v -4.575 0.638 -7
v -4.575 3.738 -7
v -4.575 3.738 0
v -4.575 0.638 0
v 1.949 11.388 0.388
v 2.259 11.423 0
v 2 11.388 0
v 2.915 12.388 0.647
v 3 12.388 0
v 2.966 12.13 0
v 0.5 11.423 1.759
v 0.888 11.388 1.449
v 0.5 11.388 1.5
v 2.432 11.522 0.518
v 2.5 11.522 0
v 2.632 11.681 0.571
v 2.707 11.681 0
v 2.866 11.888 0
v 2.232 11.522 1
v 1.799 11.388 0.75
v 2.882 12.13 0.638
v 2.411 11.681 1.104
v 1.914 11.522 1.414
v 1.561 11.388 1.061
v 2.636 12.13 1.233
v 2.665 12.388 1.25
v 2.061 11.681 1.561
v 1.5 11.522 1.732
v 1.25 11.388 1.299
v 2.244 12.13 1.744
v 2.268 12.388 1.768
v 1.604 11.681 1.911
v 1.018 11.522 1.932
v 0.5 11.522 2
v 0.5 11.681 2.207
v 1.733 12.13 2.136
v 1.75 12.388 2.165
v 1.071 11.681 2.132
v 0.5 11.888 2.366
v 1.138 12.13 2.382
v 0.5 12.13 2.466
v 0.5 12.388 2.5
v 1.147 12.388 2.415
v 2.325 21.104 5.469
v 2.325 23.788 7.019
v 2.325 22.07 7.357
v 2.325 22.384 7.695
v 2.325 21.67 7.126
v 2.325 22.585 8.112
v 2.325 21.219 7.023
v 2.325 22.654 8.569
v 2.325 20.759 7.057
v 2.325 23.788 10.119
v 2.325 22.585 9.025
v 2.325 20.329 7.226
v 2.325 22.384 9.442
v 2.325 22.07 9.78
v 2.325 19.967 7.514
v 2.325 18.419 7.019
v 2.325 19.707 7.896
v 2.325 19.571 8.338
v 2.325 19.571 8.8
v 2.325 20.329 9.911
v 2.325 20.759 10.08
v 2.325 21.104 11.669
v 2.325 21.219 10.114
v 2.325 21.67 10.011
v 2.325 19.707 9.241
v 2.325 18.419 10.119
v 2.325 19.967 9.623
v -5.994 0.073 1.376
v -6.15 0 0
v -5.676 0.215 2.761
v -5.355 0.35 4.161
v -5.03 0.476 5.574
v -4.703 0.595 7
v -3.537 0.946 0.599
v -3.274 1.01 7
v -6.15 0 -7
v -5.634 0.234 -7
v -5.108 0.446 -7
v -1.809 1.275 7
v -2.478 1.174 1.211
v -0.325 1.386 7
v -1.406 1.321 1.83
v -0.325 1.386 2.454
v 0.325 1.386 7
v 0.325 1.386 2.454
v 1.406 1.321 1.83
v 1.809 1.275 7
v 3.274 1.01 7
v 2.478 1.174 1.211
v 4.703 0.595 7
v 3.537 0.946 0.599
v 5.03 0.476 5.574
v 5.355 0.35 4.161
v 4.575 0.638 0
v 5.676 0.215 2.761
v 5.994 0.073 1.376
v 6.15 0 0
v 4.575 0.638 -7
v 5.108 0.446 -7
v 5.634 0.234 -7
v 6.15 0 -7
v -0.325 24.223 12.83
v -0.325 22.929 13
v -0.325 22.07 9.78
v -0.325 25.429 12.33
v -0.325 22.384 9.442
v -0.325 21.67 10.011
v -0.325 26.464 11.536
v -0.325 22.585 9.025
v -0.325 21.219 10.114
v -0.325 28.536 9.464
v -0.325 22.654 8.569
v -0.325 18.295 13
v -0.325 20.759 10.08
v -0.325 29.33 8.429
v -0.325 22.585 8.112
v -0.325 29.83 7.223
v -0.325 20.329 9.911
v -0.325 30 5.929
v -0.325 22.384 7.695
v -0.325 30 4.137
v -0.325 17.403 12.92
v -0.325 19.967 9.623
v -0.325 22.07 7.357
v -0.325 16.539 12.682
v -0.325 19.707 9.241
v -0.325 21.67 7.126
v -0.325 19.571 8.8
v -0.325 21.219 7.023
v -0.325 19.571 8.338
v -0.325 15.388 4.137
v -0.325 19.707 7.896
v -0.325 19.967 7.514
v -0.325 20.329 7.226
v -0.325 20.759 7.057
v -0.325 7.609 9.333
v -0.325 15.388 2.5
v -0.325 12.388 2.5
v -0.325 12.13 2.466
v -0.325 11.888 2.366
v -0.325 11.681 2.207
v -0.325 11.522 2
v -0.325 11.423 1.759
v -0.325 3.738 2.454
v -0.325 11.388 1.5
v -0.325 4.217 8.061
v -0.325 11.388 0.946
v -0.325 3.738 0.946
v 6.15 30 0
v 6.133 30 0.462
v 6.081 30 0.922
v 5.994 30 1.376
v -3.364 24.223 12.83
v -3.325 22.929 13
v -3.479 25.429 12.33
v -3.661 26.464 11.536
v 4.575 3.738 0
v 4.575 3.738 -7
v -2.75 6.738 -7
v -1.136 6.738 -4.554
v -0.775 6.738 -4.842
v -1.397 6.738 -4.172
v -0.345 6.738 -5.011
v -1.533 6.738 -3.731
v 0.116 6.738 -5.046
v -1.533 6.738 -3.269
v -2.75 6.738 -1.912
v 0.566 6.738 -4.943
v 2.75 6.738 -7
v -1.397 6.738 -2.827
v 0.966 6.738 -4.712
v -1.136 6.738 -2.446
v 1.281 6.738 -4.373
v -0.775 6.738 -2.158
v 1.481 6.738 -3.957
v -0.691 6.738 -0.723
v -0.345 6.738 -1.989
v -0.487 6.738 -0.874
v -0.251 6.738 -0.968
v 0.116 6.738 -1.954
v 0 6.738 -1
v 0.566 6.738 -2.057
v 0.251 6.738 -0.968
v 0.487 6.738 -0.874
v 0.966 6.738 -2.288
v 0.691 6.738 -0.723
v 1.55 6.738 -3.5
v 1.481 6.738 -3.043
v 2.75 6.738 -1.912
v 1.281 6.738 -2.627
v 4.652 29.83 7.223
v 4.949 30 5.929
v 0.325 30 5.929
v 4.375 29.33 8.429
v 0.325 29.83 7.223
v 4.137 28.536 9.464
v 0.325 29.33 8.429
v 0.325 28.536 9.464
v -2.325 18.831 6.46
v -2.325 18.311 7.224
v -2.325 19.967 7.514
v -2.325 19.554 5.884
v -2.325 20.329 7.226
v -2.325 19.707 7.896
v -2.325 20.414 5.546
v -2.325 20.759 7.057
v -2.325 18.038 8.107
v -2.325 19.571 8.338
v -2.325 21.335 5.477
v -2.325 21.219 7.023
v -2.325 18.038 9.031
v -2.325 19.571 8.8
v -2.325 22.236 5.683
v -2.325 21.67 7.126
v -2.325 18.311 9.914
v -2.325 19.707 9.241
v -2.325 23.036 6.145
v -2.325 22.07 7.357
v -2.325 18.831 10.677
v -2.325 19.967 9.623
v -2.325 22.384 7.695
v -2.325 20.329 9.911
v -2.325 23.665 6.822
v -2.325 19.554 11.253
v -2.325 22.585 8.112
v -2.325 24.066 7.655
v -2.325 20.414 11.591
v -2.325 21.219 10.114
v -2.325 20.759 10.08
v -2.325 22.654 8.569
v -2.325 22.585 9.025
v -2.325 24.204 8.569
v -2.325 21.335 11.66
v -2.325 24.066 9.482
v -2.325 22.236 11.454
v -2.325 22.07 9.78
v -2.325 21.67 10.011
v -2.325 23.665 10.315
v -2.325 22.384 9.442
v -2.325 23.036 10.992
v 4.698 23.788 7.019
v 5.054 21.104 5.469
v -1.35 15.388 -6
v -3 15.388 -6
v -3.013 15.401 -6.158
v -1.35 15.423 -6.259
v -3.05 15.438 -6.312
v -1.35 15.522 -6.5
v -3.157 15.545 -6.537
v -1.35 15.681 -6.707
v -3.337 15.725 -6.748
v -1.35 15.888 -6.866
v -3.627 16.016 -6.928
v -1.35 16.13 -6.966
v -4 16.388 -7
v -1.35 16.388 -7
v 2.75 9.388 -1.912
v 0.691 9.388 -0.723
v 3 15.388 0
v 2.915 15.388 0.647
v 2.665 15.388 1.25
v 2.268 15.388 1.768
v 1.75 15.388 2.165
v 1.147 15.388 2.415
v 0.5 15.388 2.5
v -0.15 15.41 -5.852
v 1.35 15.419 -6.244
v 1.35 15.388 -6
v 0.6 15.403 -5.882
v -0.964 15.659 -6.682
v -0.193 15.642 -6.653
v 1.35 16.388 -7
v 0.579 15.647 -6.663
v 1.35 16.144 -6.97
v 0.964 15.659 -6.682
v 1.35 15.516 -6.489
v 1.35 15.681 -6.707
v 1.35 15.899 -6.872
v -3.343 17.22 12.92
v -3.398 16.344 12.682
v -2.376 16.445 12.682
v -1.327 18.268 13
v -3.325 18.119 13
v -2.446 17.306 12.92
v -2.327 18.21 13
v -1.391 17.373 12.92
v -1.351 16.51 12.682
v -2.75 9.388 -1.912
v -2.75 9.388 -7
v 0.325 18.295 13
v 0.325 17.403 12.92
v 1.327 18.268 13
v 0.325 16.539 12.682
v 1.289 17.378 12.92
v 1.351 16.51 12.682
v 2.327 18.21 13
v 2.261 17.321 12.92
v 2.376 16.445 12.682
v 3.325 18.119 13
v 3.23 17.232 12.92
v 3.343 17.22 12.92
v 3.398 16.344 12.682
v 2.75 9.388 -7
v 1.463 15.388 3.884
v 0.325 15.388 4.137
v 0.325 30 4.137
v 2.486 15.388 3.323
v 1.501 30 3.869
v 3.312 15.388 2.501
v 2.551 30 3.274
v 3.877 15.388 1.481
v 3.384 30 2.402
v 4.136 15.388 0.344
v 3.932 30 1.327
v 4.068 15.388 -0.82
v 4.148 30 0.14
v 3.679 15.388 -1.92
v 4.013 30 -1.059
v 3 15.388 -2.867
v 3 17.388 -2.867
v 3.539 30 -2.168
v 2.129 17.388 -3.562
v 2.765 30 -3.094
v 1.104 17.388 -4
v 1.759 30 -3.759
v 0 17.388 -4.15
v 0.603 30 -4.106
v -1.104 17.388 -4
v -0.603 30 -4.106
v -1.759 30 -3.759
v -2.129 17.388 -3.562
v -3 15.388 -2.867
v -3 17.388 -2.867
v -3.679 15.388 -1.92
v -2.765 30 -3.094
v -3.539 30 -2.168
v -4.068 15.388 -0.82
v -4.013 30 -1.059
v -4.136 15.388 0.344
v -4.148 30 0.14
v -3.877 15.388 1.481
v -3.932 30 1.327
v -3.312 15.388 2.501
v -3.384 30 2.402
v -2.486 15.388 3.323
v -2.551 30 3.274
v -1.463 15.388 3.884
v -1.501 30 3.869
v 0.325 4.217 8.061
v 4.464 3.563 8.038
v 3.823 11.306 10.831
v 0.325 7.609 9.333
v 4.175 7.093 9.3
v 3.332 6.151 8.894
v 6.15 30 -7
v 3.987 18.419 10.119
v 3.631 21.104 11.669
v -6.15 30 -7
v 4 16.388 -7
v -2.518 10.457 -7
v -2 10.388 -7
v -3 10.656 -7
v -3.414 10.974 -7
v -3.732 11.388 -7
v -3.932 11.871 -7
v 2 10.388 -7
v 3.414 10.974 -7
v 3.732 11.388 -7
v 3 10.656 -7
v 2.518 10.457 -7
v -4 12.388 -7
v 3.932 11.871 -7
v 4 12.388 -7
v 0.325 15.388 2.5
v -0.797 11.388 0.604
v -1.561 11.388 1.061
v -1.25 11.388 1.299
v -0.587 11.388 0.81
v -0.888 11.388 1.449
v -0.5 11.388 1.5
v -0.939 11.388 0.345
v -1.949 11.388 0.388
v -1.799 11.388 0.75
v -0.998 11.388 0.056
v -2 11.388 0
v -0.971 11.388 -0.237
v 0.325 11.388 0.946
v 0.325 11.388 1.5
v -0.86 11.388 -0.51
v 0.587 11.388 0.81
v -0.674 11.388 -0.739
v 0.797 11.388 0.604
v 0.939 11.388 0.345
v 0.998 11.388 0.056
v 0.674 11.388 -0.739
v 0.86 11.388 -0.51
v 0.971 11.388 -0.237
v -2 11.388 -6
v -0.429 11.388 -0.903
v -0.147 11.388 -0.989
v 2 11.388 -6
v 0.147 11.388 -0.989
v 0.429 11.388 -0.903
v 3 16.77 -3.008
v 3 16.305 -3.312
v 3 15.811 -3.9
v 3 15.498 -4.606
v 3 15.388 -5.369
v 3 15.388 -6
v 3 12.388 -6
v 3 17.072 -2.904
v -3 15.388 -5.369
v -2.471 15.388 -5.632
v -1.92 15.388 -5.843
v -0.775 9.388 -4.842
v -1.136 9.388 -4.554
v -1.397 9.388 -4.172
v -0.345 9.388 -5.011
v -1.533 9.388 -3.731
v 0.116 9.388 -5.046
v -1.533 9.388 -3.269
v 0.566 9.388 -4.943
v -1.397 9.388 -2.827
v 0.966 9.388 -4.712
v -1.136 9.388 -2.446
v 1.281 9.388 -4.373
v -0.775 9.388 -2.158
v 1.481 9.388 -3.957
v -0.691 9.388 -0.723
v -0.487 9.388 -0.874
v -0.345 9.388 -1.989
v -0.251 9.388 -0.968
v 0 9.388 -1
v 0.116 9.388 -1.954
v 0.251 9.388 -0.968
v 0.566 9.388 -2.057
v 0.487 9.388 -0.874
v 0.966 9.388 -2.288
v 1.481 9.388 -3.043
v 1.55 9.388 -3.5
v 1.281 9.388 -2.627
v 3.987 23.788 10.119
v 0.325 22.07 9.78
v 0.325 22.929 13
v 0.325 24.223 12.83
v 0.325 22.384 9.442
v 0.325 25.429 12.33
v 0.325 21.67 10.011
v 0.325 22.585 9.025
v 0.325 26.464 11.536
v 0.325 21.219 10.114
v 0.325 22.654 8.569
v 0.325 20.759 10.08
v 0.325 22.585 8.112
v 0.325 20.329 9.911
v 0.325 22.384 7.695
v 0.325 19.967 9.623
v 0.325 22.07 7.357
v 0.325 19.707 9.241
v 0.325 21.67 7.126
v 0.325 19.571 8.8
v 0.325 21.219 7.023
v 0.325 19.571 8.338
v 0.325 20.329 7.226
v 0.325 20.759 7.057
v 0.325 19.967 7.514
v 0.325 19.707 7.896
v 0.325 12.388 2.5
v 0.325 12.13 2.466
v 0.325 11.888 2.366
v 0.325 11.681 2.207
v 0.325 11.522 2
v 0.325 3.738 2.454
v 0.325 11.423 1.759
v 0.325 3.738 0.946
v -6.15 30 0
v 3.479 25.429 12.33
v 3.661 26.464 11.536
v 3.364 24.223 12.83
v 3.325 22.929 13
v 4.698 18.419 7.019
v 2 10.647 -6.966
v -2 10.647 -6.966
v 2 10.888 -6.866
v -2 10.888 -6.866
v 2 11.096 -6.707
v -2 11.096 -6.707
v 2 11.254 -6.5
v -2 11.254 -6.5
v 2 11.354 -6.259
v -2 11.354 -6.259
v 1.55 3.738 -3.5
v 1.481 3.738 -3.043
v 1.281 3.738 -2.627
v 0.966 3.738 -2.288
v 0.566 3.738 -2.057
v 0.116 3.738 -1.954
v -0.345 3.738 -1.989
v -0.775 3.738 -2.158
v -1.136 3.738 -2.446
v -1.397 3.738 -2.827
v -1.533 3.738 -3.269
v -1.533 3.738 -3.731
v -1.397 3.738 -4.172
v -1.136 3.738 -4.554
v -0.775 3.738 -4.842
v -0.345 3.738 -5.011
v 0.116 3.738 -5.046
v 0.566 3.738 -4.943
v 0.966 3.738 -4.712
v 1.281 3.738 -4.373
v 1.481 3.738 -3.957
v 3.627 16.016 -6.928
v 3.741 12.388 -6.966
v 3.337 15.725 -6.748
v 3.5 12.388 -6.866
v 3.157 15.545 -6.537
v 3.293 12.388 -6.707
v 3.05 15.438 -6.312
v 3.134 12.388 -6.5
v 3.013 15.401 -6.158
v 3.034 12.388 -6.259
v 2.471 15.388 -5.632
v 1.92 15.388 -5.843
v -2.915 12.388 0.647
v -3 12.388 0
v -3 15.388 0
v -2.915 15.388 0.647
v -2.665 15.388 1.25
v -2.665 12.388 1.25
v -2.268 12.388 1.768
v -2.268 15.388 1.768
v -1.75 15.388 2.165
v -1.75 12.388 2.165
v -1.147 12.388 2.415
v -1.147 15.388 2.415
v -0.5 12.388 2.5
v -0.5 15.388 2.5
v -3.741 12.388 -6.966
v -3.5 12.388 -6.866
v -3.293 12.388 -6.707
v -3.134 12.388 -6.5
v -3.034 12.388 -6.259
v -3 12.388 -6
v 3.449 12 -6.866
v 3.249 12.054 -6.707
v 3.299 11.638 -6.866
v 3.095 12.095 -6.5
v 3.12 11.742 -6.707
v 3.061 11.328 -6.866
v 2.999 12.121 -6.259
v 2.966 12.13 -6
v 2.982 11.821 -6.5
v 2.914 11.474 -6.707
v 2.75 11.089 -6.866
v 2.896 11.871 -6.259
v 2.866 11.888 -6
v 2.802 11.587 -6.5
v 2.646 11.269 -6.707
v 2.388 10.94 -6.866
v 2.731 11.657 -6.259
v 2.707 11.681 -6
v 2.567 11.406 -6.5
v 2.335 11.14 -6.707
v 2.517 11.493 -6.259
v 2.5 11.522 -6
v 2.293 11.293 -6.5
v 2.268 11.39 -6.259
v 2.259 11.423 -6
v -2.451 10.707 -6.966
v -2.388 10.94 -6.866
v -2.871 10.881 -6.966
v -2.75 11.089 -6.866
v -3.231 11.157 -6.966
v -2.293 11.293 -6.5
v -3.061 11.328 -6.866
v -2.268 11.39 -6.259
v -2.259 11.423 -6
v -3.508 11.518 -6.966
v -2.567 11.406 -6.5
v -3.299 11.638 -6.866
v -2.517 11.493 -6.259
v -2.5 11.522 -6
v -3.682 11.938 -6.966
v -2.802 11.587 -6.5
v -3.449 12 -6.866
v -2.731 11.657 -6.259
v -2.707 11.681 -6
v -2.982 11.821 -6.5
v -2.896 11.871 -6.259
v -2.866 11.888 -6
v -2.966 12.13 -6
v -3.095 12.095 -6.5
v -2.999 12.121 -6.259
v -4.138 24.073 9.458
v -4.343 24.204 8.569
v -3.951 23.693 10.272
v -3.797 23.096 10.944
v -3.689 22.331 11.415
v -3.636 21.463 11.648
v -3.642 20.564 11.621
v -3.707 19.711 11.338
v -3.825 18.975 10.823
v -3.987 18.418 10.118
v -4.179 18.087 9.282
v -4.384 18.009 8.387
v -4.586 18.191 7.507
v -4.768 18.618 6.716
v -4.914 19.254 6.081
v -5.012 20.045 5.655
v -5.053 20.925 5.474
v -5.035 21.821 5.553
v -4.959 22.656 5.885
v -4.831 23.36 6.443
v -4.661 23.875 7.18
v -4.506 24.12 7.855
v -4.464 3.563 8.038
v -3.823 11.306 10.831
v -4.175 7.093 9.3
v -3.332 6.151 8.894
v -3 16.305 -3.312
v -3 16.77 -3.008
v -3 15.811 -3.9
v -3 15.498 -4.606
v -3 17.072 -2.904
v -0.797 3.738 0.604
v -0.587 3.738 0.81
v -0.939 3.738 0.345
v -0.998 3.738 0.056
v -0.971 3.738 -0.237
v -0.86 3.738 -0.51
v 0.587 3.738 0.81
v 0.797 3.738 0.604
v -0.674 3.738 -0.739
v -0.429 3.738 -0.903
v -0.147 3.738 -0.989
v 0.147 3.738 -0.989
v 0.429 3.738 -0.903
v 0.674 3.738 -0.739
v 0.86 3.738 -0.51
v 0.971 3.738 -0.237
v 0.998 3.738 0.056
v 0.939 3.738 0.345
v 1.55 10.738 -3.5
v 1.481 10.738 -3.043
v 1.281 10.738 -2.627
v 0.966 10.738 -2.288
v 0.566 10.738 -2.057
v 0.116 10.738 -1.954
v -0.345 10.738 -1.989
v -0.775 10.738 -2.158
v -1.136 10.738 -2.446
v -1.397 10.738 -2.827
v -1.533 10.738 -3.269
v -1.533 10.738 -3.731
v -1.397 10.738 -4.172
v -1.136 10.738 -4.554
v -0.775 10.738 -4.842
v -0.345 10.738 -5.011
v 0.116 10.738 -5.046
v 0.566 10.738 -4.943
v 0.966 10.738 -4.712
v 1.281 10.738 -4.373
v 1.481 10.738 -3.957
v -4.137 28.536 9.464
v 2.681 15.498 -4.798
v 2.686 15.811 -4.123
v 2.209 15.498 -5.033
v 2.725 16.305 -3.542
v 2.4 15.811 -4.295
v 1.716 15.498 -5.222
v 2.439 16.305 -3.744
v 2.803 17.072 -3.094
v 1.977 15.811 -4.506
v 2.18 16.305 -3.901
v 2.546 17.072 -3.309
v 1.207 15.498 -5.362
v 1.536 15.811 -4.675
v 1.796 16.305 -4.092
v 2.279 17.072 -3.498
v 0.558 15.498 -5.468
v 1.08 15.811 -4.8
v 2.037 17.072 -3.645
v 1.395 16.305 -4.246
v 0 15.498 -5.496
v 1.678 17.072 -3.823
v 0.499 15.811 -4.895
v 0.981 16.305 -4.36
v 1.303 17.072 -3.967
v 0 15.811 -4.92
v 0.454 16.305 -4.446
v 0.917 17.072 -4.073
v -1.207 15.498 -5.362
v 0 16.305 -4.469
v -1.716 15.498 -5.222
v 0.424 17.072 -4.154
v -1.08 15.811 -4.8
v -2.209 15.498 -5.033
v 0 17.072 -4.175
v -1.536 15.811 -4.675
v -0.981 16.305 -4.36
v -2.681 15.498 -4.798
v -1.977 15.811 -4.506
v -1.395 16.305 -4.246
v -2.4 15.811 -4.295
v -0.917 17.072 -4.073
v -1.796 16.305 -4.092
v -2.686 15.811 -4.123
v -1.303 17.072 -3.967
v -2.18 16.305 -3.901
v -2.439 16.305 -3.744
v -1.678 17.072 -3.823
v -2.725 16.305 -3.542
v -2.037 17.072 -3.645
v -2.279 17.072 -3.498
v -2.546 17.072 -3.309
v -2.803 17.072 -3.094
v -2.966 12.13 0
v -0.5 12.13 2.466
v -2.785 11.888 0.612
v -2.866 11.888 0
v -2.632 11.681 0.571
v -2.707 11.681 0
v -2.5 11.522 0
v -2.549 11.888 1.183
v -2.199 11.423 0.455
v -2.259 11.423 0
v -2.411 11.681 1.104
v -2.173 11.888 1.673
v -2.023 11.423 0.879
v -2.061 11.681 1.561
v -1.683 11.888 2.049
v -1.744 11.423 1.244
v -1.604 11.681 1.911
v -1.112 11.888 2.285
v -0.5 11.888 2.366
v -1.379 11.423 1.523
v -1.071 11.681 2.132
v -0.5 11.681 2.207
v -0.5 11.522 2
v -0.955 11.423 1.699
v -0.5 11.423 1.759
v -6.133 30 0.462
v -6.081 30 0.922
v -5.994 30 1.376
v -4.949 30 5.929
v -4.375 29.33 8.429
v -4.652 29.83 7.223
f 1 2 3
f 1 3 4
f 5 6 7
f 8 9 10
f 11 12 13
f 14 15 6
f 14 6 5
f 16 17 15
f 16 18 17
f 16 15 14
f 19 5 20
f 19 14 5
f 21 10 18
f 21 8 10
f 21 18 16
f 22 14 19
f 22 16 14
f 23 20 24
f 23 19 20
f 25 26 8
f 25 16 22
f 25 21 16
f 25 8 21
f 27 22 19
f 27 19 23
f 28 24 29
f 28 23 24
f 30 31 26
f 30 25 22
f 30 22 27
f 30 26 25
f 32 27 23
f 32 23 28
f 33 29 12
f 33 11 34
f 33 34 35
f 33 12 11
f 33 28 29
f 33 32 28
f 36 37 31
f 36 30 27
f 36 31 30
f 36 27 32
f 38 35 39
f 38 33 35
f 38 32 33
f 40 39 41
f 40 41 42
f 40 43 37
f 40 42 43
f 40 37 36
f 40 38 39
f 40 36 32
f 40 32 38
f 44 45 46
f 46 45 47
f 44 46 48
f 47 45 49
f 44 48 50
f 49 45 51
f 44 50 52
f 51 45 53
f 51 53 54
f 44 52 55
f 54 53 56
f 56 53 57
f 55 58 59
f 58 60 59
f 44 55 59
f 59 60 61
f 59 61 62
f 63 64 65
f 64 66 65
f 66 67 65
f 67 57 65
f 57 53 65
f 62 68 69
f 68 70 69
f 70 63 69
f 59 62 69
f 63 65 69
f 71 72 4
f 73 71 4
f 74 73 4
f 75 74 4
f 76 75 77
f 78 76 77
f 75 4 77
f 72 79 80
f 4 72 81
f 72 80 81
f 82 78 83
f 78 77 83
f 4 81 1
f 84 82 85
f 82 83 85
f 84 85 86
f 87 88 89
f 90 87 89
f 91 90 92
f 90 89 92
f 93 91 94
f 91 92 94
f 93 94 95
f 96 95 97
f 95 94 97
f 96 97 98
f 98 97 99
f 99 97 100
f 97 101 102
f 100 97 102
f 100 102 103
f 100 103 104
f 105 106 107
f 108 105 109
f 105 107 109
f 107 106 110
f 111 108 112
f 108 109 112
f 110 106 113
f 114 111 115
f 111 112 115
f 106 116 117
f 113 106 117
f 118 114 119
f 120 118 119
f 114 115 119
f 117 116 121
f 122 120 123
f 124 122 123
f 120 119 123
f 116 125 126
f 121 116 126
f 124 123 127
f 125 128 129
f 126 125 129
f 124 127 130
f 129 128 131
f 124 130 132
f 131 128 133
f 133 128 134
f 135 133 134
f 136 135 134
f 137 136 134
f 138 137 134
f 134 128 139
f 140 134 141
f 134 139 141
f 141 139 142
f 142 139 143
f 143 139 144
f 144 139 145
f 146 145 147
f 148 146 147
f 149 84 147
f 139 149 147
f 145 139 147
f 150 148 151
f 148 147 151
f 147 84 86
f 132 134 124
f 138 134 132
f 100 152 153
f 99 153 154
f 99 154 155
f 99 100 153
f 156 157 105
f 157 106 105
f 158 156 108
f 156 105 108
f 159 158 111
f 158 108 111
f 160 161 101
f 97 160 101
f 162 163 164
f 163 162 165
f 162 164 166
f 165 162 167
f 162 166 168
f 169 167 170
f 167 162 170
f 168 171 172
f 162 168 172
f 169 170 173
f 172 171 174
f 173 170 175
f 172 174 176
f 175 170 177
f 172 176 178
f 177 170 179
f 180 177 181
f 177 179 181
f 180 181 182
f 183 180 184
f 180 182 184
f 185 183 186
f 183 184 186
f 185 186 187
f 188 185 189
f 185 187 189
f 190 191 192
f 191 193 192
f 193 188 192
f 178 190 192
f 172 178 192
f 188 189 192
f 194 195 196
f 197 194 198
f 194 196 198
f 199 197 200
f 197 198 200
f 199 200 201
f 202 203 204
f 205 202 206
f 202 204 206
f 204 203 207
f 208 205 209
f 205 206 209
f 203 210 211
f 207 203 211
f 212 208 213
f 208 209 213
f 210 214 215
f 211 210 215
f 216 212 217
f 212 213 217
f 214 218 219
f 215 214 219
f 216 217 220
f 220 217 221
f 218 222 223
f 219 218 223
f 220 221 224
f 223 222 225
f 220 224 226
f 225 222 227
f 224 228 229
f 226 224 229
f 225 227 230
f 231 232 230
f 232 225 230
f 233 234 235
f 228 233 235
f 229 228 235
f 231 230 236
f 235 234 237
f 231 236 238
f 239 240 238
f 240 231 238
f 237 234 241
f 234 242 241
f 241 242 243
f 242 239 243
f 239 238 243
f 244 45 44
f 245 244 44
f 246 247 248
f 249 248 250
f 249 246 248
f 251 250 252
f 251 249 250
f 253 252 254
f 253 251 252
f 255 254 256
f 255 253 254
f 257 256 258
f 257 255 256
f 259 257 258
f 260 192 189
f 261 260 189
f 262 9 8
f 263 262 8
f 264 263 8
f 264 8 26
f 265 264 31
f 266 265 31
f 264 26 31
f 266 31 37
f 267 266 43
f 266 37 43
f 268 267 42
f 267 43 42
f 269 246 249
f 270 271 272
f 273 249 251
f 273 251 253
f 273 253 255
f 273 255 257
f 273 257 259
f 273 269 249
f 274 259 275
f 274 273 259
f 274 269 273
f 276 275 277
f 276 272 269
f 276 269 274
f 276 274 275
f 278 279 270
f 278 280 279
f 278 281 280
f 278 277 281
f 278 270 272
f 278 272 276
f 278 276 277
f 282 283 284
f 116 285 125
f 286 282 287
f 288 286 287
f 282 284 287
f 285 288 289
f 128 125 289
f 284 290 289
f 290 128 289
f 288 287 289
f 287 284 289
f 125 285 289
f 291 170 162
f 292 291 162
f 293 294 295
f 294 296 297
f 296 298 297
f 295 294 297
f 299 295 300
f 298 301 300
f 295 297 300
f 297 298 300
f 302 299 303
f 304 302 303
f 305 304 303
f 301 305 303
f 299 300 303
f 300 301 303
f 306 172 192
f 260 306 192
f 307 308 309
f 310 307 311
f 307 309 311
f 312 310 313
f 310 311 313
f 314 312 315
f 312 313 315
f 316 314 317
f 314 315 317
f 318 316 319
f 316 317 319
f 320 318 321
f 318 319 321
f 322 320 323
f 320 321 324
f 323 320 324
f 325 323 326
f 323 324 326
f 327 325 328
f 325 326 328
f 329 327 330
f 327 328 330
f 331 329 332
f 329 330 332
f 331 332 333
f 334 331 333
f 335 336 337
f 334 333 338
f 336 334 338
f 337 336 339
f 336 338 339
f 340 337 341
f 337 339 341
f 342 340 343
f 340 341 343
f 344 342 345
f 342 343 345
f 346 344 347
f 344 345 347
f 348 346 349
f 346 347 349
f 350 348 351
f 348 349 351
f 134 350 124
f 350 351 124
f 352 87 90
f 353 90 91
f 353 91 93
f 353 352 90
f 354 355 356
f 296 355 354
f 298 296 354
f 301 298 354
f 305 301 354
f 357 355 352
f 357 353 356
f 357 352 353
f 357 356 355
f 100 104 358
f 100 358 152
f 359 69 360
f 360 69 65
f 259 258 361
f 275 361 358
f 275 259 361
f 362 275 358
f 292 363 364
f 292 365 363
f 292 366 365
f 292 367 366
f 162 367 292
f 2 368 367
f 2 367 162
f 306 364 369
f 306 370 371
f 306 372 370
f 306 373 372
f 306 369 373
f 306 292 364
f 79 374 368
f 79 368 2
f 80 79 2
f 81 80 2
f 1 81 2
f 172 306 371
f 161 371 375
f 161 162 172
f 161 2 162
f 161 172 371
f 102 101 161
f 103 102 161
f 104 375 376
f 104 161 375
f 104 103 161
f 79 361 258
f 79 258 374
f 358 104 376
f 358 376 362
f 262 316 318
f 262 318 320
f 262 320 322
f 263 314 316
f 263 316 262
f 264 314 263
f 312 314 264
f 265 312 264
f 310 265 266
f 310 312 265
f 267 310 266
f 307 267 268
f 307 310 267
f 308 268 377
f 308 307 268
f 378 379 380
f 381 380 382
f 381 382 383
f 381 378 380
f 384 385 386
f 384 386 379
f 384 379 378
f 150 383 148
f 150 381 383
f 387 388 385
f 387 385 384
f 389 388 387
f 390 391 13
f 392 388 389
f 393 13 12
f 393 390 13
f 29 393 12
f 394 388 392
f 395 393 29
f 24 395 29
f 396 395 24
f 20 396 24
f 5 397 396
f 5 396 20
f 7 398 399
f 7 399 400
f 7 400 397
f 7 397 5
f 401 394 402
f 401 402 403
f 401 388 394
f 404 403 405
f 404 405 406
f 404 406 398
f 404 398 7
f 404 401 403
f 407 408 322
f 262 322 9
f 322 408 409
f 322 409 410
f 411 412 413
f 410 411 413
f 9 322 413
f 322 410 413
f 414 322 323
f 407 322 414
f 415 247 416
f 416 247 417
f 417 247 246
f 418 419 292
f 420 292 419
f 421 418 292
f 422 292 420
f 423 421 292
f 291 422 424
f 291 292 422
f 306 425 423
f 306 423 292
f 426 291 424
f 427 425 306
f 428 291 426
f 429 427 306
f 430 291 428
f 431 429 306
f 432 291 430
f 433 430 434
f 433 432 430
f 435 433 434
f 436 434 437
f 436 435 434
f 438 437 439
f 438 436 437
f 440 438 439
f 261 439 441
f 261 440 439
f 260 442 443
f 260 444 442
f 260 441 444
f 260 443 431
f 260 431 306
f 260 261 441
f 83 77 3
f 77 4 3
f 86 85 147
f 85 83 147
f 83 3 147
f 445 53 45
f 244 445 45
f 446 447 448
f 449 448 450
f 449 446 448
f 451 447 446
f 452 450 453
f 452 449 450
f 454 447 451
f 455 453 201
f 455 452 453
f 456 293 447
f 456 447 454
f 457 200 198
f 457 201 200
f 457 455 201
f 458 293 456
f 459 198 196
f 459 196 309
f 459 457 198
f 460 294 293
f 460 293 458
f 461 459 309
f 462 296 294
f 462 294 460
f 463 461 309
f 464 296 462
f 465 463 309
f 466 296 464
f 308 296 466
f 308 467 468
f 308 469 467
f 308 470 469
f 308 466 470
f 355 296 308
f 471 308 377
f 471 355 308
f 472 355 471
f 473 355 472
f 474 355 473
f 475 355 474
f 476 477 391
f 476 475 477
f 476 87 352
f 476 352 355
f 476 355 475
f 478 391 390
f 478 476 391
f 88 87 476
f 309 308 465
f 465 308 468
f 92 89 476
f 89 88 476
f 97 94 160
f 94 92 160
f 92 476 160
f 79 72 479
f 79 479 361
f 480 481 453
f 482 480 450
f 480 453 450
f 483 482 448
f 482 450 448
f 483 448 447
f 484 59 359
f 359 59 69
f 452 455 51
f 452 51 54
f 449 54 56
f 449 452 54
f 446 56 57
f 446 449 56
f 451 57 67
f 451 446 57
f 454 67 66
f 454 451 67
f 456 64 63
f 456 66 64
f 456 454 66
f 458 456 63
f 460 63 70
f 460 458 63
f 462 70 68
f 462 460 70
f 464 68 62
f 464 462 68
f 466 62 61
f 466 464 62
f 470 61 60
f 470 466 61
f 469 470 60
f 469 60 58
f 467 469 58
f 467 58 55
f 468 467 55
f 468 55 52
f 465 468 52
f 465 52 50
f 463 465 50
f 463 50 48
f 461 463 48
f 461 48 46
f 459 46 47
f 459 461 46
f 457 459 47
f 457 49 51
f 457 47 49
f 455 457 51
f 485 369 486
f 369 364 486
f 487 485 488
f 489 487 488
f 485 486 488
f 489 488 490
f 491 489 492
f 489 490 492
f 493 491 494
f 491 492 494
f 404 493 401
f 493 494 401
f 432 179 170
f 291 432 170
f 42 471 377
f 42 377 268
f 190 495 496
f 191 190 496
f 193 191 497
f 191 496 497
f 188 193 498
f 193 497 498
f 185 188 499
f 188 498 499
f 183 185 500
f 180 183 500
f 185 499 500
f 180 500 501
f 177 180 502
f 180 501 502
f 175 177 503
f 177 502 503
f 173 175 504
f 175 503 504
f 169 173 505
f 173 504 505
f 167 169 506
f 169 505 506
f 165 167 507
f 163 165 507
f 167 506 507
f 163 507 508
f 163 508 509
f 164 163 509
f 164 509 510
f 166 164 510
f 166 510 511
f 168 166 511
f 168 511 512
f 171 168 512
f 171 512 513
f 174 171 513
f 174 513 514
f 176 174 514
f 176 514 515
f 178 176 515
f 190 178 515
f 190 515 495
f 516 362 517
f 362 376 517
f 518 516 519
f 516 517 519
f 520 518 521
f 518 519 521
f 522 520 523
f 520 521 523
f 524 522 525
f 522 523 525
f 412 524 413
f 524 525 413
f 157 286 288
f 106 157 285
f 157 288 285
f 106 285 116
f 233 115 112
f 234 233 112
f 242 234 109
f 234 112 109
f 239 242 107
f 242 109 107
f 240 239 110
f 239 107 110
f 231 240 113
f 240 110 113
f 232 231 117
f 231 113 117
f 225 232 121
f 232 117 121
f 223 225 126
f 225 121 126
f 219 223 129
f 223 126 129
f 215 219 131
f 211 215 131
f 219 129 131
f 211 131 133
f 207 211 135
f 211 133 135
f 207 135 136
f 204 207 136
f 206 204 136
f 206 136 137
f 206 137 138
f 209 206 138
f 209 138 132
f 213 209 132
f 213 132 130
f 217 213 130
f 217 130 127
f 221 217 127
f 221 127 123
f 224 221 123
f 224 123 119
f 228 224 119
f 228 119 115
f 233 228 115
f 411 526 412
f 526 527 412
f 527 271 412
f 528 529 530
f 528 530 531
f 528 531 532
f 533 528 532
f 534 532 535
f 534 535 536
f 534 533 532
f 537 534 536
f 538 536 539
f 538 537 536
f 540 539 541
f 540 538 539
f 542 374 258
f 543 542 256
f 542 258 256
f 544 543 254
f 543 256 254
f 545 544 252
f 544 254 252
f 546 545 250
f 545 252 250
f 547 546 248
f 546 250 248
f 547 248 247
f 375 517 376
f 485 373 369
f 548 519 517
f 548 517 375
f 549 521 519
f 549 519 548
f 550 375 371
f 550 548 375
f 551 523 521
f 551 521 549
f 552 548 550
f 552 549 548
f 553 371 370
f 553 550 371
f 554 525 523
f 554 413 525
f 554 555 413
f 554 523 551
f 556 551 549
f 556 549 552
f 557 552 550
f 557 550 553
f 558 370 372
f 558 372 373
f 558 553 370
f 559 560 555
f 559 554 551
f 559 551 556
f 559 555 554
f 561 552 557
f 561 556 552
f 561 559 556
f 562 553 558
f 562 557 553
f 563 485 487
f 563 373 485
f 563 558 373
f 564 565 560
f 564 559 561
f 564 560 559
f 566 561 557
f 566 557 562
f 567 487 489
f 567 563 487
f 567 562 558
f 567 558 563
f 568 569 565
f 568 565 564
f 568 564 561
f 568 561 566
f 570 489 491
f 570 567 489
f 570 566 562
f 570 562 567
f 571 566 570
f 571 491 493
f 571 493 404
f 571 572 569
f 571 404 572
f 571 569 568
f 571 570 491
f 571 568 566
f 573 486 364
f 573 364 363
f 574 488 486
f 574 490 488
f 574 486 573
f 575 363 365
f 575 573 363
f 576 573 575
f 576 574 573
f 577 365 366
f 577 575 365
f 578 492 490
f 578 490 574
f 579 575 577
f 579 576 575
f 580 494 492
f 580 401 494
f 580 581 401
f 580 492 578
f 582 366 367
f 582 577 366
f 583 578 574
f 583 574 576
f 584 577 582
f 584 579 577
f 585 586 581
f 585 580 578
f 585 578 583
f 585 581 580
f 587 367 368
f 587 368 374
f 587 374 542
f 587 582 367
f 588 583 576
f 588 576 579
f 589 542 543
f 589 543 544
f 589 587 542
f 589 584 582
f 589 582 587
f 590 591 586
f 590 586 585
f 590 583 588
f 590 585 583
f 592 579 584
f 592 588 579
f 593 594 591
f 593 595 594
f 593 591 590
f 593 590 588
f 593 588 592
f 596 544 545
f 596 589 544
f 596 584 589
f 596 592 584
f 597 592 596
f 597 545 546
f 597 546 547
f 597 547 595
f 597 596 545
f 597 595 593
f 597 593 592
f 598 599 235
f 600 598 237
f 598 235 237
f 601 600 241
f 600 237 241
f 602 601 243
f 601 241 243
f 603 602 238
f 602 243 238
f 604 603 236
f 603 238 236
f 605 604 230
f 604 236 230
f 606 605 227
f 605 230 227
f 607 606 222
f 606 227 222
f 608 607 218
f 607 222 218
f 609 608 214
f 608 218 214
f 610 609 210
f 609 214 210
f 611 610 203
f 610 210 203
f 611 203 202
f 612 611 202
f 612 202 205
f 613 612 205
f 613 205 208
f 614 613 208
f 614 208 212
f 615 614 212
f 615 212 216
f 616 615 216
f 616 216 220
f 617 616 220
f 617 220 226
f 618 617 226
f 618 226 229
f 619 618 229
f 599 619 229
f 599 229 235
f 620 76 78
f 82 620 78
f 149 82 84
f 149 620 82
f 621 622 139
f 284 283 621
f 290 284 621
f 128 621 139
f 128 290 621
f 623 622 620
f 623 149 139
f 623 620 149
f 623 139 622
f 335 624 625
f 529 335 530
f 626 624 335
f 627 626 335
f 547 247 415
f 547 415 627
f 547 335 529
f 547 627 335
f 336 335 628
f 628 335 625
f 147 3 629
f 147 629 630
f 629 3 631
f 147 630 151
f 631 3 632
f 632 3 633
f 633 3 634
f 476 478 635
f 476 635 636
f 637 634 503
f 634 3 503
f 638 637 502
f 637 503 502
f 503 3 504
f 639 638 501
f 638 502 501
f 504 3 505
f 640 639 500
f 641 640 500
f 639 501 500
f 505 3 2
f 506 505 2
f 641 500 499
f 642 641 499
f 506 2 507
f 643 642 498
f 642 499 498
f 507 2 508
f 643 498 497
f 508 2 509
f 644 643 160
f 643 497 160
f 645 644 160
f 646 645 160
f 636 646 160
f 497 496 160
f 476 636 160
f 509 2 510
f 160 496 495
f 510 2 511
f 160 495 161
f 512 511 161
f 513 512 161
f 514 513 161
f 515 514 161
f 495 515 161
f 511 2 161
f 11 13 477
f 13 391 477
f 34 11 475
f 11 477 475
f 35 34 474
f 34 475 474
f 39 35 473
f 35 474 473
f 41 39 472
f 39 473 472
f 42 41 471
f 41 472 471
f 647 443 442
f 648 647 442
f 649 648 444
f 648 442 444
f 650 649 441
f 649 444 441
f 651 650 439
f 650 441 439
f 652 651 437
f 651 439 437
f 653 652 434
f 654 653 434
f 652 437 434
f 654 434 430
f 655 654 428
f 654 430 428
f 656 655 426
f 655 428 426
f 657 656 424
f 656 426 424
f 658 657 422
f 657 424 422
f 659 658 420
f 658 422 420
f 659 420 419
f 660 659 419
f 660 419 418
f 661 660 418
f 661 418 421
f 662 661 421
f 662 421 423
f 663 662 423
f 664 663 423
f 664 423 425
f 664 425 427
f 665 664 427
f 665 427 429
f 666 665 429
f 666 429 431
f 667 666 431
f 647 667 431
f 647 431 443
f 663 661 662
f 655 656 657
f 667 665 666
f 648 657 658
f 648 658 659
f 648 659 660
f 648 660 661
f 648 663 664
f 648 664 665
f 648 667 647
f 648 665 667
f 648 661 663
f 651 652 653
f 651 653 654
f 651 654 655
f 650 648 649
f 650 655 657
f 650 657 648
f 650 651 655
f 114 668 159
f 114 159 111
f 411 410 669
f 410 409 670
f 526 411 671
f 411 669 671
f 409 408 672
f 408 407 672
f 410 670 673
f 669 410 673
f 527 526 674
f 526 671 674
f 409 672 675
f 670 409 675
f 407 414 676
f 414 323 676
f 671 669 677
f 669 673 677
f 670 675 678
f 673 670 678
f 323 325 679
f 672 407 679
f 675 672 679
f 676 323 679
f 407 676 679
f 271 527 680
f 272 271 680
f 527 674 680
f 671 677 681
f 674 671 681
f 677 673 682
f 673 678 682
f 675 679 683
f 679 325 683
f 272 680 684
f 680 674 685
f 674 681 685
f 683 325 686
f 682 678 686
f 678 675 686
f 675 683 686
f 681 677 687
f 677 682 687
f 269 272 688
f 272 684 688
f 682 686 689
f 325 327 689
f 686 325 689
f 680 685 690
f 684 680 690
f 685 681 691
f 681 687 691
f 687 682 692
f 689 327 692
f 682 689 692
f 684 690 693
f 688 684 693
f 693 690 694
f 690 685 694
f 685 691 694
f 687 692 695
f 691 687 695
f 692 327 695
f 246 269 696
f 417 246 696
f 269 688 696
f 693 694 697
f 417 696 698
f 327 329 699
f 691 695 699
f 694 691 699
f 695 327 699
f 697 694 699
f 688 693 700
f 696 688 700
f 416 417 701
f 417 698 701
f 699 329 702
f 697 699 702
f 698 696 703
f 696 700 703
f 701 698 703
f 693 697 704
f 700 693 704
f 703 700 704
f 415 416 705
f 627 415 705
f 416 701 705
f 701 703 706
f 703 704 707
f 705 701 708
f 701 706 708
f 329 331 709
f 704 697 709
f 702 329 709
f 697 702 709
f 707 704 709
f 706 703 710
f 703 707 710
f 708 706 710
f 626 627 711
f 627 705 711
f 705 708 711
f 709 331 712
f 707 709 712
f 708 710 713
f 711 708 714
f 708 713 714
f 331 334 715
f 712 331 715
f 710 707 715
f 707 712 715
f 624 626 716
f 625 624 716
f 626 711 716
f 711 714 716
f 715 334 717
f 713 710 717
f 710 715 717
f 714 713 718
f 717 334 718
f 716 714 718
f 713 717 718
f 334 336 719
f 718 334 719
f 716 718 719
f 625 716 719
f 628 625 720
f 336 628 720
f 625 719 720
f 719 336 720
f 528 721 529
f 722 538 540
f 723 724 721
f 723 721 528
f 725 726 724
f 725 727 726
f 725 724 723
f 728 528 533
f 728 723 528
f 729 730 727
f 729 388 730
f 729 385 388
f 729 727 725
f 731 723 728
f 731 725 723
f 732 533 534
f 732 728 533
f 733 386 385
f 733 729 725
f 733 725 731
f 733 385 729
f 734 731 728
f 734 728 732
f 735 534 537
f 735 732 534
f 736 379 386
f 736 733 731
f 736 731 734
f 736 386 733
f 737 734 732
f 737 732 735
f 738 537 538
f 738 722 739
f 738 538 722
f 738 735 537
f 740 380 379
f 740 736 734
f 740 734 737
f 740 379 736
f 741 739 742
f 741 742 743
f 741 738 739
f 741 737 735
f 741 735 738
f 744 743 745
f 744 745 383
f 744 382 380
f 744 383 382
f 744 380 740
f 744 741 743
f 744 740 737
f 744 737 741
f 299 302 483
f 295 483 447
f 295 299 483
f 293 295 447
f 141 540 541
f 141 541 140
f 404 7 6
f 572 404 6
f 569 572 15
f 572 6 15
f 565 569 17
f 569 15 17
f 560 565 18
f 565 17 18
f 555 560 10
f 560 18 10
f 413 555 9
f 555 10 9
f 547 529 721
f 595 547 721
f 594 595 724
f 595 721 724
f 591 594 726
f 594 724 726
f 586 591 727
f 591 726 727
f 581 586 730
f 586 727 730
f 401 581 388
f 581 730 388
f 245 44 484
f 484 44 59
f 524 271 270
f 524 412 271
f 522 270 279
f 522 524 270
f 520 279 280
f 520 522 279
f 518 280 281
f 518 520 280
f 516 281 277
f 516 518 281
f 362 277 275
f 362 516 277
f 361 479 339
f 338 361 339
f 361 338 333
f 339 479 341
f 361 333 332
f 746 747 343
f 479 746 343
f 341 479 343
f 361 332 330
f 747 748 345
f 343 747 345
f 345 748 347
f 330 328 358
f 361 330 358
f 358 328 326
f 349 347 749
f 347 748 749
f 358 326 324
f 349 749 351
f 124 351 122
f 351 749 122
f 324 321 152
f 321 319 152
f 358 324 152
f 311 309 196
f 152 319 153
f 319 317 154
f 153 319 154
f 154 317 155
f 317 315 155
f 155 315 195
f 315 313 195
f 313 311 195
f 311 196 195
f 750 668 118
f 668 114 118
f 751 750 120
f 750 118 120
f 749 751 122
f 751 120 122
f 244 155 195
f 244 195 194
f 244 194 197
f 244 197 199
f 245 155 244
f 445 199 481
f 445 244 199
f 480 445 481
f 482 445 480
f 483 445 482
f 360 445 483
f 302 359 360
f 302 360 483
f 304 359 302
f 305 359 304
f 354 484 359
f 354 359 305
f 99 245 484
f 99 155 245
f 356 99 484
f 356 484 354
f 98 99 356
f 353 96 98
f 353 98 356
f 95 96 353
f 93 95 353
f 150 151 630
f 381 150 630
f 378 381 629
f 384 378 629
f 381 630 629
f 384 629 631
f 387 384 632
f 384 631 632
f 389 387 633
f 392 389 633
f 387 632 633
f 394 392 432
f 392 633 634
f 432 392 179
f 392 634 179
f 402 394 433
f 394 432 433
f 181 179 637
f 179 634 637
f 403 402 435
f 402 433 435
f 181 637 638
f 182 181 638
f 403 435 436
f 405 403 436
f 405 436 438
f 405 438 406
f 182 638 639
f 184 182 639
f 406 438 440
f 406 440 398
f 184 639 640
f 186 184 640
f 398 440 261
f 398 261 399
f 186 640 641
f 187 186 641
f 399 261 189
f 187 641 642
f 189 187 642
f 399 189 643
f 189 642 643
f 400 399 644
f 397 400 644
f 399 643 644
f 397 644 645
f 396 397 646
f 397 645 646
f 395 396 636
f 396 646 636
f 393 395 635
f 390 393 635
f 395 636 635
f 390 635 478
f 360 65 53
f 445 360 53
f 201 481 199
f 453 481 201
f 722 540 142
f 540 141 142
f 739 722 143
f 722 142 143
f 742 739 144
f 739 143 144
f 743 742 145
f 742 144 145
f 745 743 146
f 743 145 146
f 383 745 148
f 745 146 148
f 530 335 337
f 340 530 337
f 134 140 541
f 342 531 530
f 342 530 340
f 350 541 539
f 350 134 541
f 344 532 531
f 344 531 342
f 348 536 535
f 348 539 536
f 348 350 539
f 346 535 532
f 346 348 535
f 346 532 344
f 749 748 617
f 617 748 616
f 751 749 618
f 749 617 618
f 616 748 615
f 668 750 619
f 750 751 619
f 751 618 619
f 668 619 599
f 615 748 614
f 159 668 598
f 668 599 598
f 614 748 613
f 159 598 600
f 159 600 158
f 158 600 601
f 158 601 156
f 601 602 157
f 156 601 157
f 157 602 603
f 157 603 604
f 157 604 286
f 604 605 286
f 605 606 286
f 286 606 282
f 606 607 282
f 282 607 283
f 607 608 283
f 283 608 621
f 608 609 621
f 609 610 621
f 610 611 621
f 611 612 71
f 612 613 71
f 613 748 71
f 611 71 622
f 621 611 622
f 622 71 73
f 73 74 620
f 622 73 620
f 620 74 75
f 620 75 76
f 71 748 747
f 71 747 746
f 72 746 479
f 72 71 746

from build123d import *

# Parameters (mm, degrees)
EXTRUDE003_DEPTH                     = 10
SKETCH009_R                          = 3.1
EXTRUDE002_DEPTH                     = 10
EXTRUDE001_DEPTH                     = 2.65
EXTRUDE001_ONTO_SKETCH005_ROLL_ANGLE = 90
EXTRUDE_DEPTH                        = 30
EXTRUDE_ONTO_SKETCH_ROLL_ANGLE       = 90
POCKET_DEPTH                         = 20.000966
SKETCH002_W                          = 9.15
SKETCH002_H                          = 3.1
POCKET001_DEPTH                      = 7
POCKET002_DEPTH                      = 3.739432
SKETCH004_R                          = 1.55
POCKET003_DEPTH                      = 7
SKETCH006_W                          = 6
SKETCH006_H                          = 4
POCKET004_DEPTH                      = 9.5
SKETCH007_R                          = 4.15
POCKET005_DEPTH                      = 14.611568
FILLET_R                             = 2.5
FILLET001_R                          = 1
FILLET002_R                          = 2
FILLET003_R                          = 1
CHAMFER_1_SIZE2                      = 16
CHAMFER_1_SIZE                       = 6
CHAMFER_2_SIZE2                      = 16
CHAMFER_2_SIZE                       = 6
CHAMFER001_SIZE                      = 5
SKETCH008_R                          = 1.55
POCKET006_DEPTH                      = 5.826
POCKET006_DEPTH_BACK                 = 6.476
FILLET004_R                          = 5


with BuildPart() as extrude003:
    # Sketch010 → Extrude003 (new body)
    with BuildSketch(Plane(origin=(0.325, 0, 0), x_dir=(0, -1, 0), z_dir=(-1, 0, 0))):
        Polygon((-21.103517, 11.668627), (-23.788196, 10.118627), (-23.788196, 7.018627), (-21.103517, 5.468627), (-18.418839, 7.018627), (-18.418839, 10.118627), align=None)
    extrude(amount=-EXTRUDE003_DEPTH)


with BuildPart() as extrude003_1:
    # Extrude003 placement: moved
    add(extrude003.part.moved(Location((2, 0, 0))))


with BuildPart() as extrude002:
    # Sketch009 → Extrude002 (new body)
    with BuildSketch(Plane.YZ.offset(-0.325)):
        with Locations((21.103517, 8.568627)):
            Circle(SKETCH009_R)
    extrude(amount=-EXTRUDE002_DEPTH)


with BuildPart() as extrude002_1:
    # Extrude002 placement: moved
    add(extrude002.part.moved(Location((-2, 0, 0))))


with BuildPart() as extrude001:
    # Sketch005 as drawn → Extrude001 (new)
    with BuildSketch(Plane.XY):
        Polygon((-2.75, -6.999966), (2.75, -6.999966), (2.75, -1.912252), (0, -0.324539), (-2.75, -1.912252), align=None)
    extrude(amount=-EXTRUDE001_DEPTH)


with BuildPart() as extrude001_1:
    # Extrude001 onto Sketch005 roll: moved
    add(extrude001.part.rotate(Axis((0, 0, 0), (1, 0, 0)), EXTRUDE001_ONTO_SKETCH005_ROLL_ANGLE))


with BuildPart() as extrude001_2:
    # Extrude001 onto Sketch005 placement: moved
    add(extrude001_1.part.moved(Location((0, 3.738432, 0))))


with BuildPart() as extrude001_3:
    # Extrude001 placement: moved
    add(extrude001_2.part.moved(Location((0, 3, 0))))


with BuildPart() as cut002:
    # Sketch as drawn → Extrude (new)
    with BuildSketch(Plane.XY):
        with BuildLine():
            ThreePointArc((-5.994013, 1.376339), (-6.110877, 0.692592), (-6.15, 3.4e-05))
            Line((-6.15, 3.4e-05), (-6.15, -6.999966))
            Line((-6.15, -6.999966), (6.15, -6.999966))
            Line((6.15, -6.999966), (6.15, 0))
            ThreePointArc((6.15, 0), (6.110879, 0.692575), (5.994013, 1.376339))
            Line((5.994013, 1.376339), (3.325, 13))
            Line((3.325, 13), (0.325, 13))
            Line((0.325, 13), (0.325, 0.945714))
            ThreePointArc((-0.325, 0.945714), (0, -1), (0.325, 0.945714))
            Line((-0.325, 13), (-0.325, 0.945714))
            Line((-3.325, 13), (-0.325, 13))
            Line((-5.994013, 1.376339), (-3.325, 13))
        make_face()
    extrude(amount=-EXTRUDE_DEPTH)


with BuildPart() as cut002_1:
    # Extrude onto Sketch roll: moved
    add(cut002.part.rotate(Axis((0, 0, 0), (1, 0, 0)), EXTRUDE_ONTO_SKETCH_ROLL_ANGLE))


with BuildPart() as cut002_2:
    # Extrude onto Sketch placement: moved
    add(cut002_1.part)

    # Sketch001 → Pocket (cut, through all)
    with BuildSketch(Plane(origin=(0, 0, -6.999966), x_dir=(1, 0, 0), z_dir=(0, 0, -1))):
        with BuildLine():
            Line((-6.15, 0), (6.15, 0))
            ThreePointArc((-6.15, 0), (0, -1.390023), (6.15, 0))
        make_face()
    extrude(amount=-POCKET_DEPTH, mode=Mode.SUBTRACT)

    # Sketch002 → Pocket001 (cut)
    with BuildSketch(Plane(origin=(0, 0, -6.999966), x_dir=(1, 0, 0), z_dir=(0, 0, -1))):
        with Locations((0, -2.188432)):
            Rectangle(SKETCH002_W, SKETCH002_H)
    extrude(amount=-POCKET001_DEPTH, mode=Mode.SUBTRACT)

    # Sketch003 → Pocket002 (cut, through all)
    with BuildSketch(Plane.XZ.offset(-3.738432)):
        Polygon((4.575, 3.4e-05), (-4.575, 3.4e-05), (0, 2.641412), align=None)
    extrude(amount=POCKET002_DEPTH, mode=Mode.SUBTRACT)

    # Sketch004 → Pocket003 (cut)
    with BuildSketch(Plane.XZ.offset(-3.738432)):
        with Locations((0, -3.499966)):
            Circle(SKETCH004_R)
    extrude(amount=-POCKET003_DEPTH, mode=Mode.SUBTRACT)

    # Cut: cut Extrude001
    add(extrude001_3.part, mode=Mode.SUBTRACT)

    # Sketch006 → Pocket004 (cut)
    with BuildSketch(Plane(origin=(0, 0, -6.999966), x_dir=(1, 0, 0), z_dir=(0, 0, -1))):
        with Locations((0, -13.388432)):
            Rectangle(SKETCH006_W, SKETCH006_H)
    extrude(amount=-POCKET004_DEPTH, mode=Mode.SUBTRACT)

    # Sketch007 → Pocket005 (cut)
    with BuildSketch(Plane(origin=(0, 30, 0), x_dir=(-1, 0, 0), z_dir=(0, 1, 0))):
        Circle(SKETCH007_R)
    extrude(amount=-POCKET005_DEPTH, mode=Mode.SUBTRACT)

    # Fillet
    fillet_edges = [cut002_2.edges().sort_by_distance(p)[0] for p in [
        (3, 13.388432, 2.500034),
        (-3, 13.388432, 2.500034),
    ]]
    fillet(fillet_edges, radius=FILLET_R)

    # Fillet001
    fillet001_edges = [cut002_2.edges().sort_by_distance(p)[0] for p in [
        (3, 11.388432, -3.499966),
        (2.267767, 11.388432, 1.767801),
        (0.4125, 11.388432, 2.500034),
        (-3, 11.388432, -3.499966),
        (-2.267767, 11.388432, 1.767801),
        (-0.4125, 11.388432, 2.500034),
    ]]
    fillet(fillet001_edges, radius=FILLET001_R)

    # Fillet002
    fillet002_edges = [cut002_2.edges().sort_by_distance(p)[0] for p in [
        (0, 15.388432, -4.15),
    ]]
    fillet(fillet002_edges, radius=FILLET002_R)

    # Fillet003
    fillet003_edges = [cut002_2.edges().sort_by_distance(p)[0] for p in [
        (3, 13.888432, -6.999966),
        (0, 15.388432, -6.999966),
        (2.707107, 11.681325, -6.999966),
        (0, 11.388432, -6.999966),
        (-3, 13.888432, -6.999966),
        (-2.707107, 11.681325, -6.999966),
    ]]
    fillet(fillet003_edges, radius=FILLET003_R)

    # Chamfer 1
    chamfer_1_edges = [cut002_2.edges().sort_by_distance(p)[0] for p in [
        (1.835295, 1.271761, 13),
    ]]
    chamfer_1_side = cut002_2.faces().sort_by_distance((3.310874, 1.001462, 3.000017))[0]
    chamfer(chamfer_1_edges, length=CHAMFER_1_SIZE, length2=CHAMFER_1_SIZE2, reference=chamfer_1_side)

    # Chamfer 2
    chamfer_2_edges = [cut002_2.edges().sort_by_distance(p)[0] for p in [
        (-1.835295, 1.271761, 13),
    ]]
    chamfer_2_side = cut002_2.faces().sort_by_distance((-3.310874, 1.001462, 3.000017))[0]
    chamfer(chamfer_2_edges, length=CHAMFER_2_SIZE, length2=CHAMFER_2_SIZE2, reference=chamfer_2_side)

    # Chamfer001
    chamfer001_edges = [cut002_2.edges().sort_by_distance(p)[0] for p in [
        (1.825, 30, 13),
        (-1.825, 30, 13),
    ]]
    chamfer(chamfer001_edges, length=CHAMFER001_SIZE)

    # Sketch008 → Pocket006 (cut, two sides)
    with BuildSketch(Plane.YZ.offset(-0.325)) as pocket006_sk:
        with Locations((21.103517, 8.568627)):
            Circle(SKETCH008_R)
    extrude(amount=-POCKET006_DEPTH, mode=Mode.SUBTRACT)
    extrude(pocket006_sk.sketch, amount=POCKET006_DEPTH_BACK, mode=Mode.SUBTRACT)

    # Fillet004
    fillet004_edges = [cut002_2.edges().sort_by_distance(p)[0] for p in [
        (1.825, 25, 13),
        (1.827249, 17.334877, 13),
        (2.399047, 30, 8),
        (-2.399047, 30, 8),
        (-1.825, 25, 13),
        (-1.827249, 17.334877, 13),
    ]]
    fillet(fillet004_edges, radius=FILLET004_R)

    # Cut001: cut Extrude002
    add(extrude002_1.part, mode=Mode.SUBTRACT)

    # Cut002: cut Extrude003
    add(extrude003_1.part, mode=Mode.SUBTRACT)


solid = cut002_2.part
